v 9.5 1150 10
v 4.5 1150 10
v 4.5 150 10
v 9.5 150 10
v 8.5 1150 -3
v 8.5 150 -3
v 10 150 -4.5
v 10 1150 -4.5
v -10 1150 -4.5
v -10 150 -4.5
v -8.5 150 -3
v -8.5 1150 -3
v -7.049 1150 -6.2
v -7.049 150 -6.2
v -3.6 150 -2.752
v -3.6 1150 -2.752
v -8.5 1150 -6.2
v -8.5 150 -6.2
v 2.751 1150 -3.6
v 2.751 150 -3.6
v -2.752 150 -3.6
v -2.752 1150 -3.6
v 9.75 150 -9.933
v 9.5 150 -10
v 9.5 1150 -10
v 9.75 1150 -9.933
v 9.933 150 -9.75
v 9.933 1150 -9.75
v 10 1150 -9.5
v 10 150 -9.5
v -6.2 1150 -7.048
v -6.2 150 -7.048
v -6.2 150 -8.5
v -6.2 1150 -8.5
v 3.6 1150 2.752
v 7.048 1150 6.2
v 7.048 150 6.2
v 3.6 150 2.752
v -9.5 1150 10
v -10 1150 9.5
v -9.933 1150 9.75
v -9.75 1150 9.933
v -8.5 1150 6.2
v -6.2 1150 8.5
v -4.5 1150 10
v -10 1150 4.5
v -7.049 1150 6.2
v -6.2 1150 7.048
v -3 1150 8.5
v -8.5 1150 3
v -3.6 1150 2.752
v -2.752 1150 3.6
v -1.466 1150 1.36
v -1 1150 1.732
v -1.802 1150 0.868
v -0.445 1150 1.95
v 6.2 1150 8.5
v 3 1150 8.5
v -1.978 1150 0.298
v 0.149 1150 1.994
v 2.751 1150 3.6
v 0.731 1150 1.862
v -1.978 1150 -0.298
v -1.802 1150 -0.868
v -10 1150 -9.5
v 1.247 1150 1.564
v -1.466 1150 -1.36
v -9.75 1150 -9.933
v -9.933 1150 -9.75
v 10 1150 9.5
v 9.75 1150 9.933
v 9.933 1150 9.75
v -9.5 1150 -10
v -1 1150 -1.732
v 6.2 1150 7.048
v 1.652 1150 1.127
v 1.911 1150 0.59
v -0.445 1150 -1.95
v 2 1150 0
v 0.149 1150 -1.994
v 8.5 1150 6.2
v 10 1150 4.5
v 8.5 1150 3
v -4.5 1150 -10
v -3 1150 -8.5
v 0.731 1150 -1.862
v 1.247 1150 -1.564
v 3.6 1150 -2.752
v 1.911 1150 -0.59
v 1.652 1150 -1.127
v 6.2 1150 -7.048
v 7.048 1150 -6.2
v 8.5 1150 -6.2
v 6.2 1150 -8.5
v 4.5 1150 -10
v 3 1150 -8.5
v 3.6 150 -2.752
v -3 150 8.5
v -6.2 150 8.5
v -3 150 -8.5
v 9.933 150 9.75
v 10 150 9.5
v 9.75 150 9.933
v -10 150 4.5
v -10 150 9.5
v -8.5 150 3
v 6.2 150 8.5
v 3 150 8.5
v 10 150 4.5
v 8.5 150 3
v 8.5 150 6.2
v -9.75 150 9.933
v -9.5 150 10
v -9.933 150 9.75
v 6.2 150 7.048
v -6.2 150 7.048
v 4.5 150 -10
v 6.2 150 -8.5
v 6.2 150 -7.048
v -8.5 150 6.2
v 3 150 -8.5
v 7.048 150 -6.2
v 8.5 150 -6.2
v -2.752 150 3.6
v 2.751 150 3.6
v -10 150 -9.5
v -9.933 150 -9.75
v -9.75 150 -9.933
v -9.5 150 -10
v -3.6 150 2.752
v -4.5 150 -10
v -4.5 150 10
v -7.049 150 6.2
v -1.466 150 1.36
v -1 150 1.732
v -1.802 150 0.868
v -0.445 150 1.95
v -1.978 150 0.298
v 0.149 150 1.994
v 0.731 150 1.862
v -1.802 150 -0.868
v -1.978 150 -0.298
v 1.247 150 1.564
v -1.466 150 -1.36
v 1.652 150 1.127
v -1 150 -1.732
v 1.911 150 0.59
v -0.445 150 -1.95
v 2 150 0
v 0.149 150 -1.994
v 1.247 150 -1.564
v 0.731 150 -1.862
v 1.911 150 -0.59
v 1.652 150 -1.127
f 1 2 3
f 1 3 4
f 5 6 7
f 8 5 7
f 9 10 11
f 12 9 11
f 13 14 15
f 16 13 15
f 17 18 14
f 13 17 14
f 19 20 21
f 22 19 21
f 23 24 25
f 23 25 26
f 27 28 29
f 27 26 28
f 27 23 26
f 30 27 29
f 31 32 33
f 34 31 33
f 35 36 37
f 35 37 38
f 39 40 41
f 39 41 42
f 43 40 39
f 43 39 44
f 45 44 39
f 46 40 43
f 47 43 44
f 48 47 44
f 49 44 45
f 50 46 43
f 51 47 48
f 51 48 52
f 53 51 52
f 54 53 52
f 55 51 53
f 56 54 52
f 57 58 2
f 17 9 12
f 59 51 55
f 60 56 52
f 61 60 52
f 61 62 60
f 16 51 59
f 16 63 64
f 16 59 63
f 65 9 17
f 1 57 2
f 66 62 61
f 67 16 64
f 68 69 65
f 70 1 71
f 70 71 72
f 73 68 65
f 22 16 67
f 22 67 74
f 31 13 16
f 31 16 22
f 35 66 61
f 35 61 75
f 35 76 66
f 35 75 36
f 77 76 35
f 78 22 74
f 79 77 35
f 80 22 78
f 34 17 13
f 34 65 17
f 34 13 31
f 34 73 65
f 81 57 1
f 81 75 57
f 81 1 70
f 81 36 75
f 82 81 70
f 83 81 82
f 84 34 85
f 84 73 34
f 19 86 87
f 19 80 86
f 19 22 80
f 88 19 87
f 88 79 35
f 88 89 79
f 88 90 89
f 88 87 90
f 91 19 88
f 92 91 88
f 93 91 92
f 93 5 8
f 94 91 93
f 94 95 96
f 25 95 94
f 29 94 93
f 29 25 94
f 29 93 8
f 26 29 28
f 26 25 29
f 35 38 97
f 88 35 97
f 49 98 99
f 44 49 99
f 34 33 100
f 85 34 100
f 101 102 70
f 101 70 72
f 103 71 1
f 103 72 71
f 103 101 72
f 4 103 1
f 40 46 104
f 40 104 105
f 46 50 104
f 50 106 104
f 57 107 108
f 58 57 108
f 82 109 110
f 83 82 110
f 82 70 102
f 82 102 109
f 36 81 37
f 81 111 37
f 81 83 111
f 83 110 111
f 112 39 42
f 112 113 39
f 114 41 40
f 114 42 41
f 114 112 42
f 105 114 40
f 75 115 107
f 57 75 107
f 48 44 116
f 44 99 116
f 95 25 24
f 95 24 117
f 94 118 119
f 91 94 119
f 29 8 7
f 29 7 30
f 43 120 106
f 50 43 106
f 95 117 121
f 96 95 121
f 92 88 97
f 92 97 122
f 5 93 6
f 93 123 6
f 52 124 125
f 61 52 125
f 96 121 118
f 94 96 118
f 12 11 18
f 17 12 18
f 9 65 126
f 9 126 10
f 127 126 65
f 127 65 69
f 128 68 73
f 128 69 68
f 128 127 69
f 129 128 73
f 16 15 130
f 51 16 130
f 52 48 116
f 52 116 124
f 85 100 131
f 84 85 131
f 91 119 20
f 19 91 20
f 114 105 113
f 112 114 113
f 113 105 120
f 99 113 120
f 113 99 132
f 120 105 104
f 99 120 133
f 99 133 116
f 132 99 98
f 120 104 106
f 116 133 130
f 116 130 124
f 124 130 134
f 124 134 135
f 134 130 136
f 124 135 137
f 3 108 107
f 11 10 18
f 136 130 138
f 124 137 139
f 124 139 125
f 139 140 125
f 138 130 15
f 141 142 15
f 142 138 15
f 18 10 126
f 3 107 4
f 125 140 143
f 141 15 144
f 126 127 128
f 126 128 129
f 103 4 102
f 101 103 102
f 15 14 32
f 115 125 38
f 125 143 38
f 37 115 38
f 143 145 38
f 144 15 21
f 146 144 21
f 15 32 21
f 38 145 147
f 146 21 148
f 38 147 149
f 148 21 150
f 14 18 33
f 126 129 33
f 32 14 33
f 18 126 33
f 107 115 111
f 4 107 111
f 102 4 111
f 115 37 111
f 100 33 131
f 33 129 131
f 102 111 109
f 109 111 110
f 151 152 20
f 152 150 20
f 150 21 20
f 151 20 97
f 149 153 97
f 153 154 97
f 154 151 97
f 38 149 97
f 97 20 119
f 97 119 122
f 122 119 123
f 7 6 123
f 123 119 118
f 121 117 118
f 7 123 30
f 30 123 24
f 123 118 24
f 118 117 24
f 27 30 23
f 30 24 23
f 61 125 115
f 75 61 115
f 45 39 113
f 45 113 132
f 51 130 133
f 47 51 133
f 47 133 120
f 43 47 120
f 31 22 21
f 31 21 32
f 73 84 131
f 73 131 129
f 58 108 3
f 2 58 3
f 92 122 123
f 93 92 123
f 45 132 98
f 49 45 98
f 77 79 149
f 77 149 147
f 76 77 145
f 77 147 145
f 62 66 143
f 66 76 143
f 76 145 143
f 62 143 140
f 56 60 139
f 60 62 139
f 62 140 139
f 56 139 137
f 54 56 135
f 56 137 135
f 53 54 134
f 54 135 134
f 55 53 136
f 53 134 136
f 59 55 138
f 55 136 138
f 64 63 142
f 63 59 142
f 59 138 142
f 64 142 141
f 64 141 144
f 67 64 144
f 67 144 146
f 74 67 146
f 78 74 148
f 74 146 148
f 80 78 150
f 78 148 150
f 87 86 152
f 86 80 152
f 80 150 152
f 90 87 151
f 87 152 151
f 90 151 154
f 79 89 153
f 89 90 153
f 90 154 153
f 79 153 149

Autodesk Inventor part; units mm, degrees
ref_plane "YZ Plane" through (0, 0, 0) normal (1, 0, 0) x (0, 1, 0)
ref_plane "XZ Plane" through (0, 0, 0) normal (0, 1, 0) x (-1, 0, 0)
ref_plane "Work Plane1" through (-2.7515, 150, 3.6) normal (0, 1, 0) x (1, 0, 0)
sketch "Sketch1" plane through (-2.7515, 150, 3.6) normal (0, 1, 0) x (1, 0, 0)
  arc A0 (-6.7485, 13.6) -> (-7.2485, 13.1) centre (-6.7485, 13.1) ccw projected
  line L0 (-7.2485, 13.1) -> (-7.2485, 8.1) projected
  line L1 (-7.2485, 8.1) -> (-5.7485, 6.6) projected
  line L2 (-5.7485, 6.6) -> (-5.7485, 9.8) projected
  line L3 (-5.7485, 9.8) -> (-4.2971, 9.8) projected
  line L4 (-4.2971, 9.8) -> (-0.8485, 6.3515) projected
  line L5 (-0.8485, 6.3515) -> (-0.8485, 0.8485) projected
  line L6 (-0.8485, 0.8485) -> (-4.2971, -2.6) projected
  line L7 (-4.2971, -2.6) -> (-5.7485, -2.6) projected
  line L8 (-5.7485, -2.6) -> (-5.7485, 0.6) projected
  line L9 (-5.7485, 0.6) -> (-7.2485, -0.9) projected
  line L10 (-7.2485, -0.9) -> (-7.2485, -5.9) projected
  arc A1 (-7.2485, -5.9) -> (-6.7485, -6.4) centre (-6.7485, -5.9) ccw projected
  line L11 (-6.7485, -6.4) -> (-1.7485, -6.4) projected
  line L12 (-1.7485, -6.4) -> (-0.2485, -4.9) projected
  line L13 (-0.2485, -4.9) -> (-3.4485, -4.9) projected
  line L14 (-3.4485, -4.9) -> (-3.4485, -3.4485) projected
  line L15 (-3.4485, -3.4485) -> (0, 0) projected
  line L16 (0, 0) -> (5.5029, 0) projected
  line L17 (5.5029, 0) -> (8.9515, -3.4485) projected
  line L18 (8.9515, -3.4485) -> (8.9515, -4.9) projected
  line L19 (8.9515, -4.9) -> (5.7515, -4.9) projected
  line L20 (5.7515, -4.9) -> (7.2515, -6.4) projected
  line L21 (7.2515, -6.4) -> (12.2515, -6.4) projected
  arc A2 (12.2515, -6.4) -> (12.7515, -5.9) centre (12.2515, -5.9) ccw projected
  line L22 (12.7515, -5.9) -> (12.7515, -0.9) projected
  line L23 (12.7515, -0.9) -> (11.2515, 0.6) projected
  line L24 (11.2515, 0.6) -> (11.2515, -2.6) projected
  line L25 (11.2515, -2.6) -> (9.8, -2.6) projected
  line L26 (9.8, -2.6) -> (6.3515, 0.8485) projected
  line L27 (6.3515, 0.8485) -> (6.3515, 6.3515) projected
  line L28 (6.3515, 6.3515) -> (9.8, 9.8) projected
  line L29 (9.8, 9.8) -> (11.2515, 9.8) projected
  line L30 (11.2515, 9.8) -> (11.2515, 6.6) projected
  line L31 (11.2515, 6.6) -> (12.7515, 8.1) projected
  line L32 (12.7515, 8.1) -> (12.7515, 13.1) projected
  arc A3 (12.7515, 13.1) -> (12.2515, 13.6) centre (12.2515, 13.1) ccw projected
  line L33 (12.2515, 13.6) -> (7.2515, 13.6) projected
  line L34 (7.2515, 13.6) -> (5.7515, 12.1) projected
  line L35 (5.7515, 12.1) -> (8.9515, 12.1) projected
  line L36 (8.9515, 12.1) -> (8.9515, 10.6485) projected
  line L37 (8.9515, 10.6485) -> (5.5029, 7.2) projected
  line L38 (5.5029, 7.2) -> (0, 7.2) projected
  line L39 (0, 7.2) -> (-3.4485, 10.6485) projected
  line L40 (-3.4485, 10.6485) -> (-3.4485, 12.1) projected
  line L41 (-3.4485, 12.1) -> (-0.2485, 12.1) projected
  line L42 (-0.2485, 12.1) -> (-1.7485, 13.6) projected
  line L43 (-1.7485, 13.6) -> (-6.7485, 13.6) projected
  circle A4 centre (2.7515, 3.6) radius 2 projected
extrude "Extrusion1" add sketch "Sketch1" along normal blind 1000
ref_plane "Work Plane2" through (0, 150, -9.5) normal (1, 0, 0) x (0, 0, -1)
ref_plane "Work Plane3" through (-4.5, 150, 0) normal (0, 0, 1) x (1, 0, 0)
ref_plane "Work Plane4" through (-2.7515, 1050, 3.6) normal (0, 1, 0) x (1, 0, 0)
ref_plane "Work Plane5" through (-2.7515, 250, 3.6) normal (0, -1, 0) x (1, 0, 0)
properties part number "20x20mmx150mm alminum profile" material "Aluminum 6061"
